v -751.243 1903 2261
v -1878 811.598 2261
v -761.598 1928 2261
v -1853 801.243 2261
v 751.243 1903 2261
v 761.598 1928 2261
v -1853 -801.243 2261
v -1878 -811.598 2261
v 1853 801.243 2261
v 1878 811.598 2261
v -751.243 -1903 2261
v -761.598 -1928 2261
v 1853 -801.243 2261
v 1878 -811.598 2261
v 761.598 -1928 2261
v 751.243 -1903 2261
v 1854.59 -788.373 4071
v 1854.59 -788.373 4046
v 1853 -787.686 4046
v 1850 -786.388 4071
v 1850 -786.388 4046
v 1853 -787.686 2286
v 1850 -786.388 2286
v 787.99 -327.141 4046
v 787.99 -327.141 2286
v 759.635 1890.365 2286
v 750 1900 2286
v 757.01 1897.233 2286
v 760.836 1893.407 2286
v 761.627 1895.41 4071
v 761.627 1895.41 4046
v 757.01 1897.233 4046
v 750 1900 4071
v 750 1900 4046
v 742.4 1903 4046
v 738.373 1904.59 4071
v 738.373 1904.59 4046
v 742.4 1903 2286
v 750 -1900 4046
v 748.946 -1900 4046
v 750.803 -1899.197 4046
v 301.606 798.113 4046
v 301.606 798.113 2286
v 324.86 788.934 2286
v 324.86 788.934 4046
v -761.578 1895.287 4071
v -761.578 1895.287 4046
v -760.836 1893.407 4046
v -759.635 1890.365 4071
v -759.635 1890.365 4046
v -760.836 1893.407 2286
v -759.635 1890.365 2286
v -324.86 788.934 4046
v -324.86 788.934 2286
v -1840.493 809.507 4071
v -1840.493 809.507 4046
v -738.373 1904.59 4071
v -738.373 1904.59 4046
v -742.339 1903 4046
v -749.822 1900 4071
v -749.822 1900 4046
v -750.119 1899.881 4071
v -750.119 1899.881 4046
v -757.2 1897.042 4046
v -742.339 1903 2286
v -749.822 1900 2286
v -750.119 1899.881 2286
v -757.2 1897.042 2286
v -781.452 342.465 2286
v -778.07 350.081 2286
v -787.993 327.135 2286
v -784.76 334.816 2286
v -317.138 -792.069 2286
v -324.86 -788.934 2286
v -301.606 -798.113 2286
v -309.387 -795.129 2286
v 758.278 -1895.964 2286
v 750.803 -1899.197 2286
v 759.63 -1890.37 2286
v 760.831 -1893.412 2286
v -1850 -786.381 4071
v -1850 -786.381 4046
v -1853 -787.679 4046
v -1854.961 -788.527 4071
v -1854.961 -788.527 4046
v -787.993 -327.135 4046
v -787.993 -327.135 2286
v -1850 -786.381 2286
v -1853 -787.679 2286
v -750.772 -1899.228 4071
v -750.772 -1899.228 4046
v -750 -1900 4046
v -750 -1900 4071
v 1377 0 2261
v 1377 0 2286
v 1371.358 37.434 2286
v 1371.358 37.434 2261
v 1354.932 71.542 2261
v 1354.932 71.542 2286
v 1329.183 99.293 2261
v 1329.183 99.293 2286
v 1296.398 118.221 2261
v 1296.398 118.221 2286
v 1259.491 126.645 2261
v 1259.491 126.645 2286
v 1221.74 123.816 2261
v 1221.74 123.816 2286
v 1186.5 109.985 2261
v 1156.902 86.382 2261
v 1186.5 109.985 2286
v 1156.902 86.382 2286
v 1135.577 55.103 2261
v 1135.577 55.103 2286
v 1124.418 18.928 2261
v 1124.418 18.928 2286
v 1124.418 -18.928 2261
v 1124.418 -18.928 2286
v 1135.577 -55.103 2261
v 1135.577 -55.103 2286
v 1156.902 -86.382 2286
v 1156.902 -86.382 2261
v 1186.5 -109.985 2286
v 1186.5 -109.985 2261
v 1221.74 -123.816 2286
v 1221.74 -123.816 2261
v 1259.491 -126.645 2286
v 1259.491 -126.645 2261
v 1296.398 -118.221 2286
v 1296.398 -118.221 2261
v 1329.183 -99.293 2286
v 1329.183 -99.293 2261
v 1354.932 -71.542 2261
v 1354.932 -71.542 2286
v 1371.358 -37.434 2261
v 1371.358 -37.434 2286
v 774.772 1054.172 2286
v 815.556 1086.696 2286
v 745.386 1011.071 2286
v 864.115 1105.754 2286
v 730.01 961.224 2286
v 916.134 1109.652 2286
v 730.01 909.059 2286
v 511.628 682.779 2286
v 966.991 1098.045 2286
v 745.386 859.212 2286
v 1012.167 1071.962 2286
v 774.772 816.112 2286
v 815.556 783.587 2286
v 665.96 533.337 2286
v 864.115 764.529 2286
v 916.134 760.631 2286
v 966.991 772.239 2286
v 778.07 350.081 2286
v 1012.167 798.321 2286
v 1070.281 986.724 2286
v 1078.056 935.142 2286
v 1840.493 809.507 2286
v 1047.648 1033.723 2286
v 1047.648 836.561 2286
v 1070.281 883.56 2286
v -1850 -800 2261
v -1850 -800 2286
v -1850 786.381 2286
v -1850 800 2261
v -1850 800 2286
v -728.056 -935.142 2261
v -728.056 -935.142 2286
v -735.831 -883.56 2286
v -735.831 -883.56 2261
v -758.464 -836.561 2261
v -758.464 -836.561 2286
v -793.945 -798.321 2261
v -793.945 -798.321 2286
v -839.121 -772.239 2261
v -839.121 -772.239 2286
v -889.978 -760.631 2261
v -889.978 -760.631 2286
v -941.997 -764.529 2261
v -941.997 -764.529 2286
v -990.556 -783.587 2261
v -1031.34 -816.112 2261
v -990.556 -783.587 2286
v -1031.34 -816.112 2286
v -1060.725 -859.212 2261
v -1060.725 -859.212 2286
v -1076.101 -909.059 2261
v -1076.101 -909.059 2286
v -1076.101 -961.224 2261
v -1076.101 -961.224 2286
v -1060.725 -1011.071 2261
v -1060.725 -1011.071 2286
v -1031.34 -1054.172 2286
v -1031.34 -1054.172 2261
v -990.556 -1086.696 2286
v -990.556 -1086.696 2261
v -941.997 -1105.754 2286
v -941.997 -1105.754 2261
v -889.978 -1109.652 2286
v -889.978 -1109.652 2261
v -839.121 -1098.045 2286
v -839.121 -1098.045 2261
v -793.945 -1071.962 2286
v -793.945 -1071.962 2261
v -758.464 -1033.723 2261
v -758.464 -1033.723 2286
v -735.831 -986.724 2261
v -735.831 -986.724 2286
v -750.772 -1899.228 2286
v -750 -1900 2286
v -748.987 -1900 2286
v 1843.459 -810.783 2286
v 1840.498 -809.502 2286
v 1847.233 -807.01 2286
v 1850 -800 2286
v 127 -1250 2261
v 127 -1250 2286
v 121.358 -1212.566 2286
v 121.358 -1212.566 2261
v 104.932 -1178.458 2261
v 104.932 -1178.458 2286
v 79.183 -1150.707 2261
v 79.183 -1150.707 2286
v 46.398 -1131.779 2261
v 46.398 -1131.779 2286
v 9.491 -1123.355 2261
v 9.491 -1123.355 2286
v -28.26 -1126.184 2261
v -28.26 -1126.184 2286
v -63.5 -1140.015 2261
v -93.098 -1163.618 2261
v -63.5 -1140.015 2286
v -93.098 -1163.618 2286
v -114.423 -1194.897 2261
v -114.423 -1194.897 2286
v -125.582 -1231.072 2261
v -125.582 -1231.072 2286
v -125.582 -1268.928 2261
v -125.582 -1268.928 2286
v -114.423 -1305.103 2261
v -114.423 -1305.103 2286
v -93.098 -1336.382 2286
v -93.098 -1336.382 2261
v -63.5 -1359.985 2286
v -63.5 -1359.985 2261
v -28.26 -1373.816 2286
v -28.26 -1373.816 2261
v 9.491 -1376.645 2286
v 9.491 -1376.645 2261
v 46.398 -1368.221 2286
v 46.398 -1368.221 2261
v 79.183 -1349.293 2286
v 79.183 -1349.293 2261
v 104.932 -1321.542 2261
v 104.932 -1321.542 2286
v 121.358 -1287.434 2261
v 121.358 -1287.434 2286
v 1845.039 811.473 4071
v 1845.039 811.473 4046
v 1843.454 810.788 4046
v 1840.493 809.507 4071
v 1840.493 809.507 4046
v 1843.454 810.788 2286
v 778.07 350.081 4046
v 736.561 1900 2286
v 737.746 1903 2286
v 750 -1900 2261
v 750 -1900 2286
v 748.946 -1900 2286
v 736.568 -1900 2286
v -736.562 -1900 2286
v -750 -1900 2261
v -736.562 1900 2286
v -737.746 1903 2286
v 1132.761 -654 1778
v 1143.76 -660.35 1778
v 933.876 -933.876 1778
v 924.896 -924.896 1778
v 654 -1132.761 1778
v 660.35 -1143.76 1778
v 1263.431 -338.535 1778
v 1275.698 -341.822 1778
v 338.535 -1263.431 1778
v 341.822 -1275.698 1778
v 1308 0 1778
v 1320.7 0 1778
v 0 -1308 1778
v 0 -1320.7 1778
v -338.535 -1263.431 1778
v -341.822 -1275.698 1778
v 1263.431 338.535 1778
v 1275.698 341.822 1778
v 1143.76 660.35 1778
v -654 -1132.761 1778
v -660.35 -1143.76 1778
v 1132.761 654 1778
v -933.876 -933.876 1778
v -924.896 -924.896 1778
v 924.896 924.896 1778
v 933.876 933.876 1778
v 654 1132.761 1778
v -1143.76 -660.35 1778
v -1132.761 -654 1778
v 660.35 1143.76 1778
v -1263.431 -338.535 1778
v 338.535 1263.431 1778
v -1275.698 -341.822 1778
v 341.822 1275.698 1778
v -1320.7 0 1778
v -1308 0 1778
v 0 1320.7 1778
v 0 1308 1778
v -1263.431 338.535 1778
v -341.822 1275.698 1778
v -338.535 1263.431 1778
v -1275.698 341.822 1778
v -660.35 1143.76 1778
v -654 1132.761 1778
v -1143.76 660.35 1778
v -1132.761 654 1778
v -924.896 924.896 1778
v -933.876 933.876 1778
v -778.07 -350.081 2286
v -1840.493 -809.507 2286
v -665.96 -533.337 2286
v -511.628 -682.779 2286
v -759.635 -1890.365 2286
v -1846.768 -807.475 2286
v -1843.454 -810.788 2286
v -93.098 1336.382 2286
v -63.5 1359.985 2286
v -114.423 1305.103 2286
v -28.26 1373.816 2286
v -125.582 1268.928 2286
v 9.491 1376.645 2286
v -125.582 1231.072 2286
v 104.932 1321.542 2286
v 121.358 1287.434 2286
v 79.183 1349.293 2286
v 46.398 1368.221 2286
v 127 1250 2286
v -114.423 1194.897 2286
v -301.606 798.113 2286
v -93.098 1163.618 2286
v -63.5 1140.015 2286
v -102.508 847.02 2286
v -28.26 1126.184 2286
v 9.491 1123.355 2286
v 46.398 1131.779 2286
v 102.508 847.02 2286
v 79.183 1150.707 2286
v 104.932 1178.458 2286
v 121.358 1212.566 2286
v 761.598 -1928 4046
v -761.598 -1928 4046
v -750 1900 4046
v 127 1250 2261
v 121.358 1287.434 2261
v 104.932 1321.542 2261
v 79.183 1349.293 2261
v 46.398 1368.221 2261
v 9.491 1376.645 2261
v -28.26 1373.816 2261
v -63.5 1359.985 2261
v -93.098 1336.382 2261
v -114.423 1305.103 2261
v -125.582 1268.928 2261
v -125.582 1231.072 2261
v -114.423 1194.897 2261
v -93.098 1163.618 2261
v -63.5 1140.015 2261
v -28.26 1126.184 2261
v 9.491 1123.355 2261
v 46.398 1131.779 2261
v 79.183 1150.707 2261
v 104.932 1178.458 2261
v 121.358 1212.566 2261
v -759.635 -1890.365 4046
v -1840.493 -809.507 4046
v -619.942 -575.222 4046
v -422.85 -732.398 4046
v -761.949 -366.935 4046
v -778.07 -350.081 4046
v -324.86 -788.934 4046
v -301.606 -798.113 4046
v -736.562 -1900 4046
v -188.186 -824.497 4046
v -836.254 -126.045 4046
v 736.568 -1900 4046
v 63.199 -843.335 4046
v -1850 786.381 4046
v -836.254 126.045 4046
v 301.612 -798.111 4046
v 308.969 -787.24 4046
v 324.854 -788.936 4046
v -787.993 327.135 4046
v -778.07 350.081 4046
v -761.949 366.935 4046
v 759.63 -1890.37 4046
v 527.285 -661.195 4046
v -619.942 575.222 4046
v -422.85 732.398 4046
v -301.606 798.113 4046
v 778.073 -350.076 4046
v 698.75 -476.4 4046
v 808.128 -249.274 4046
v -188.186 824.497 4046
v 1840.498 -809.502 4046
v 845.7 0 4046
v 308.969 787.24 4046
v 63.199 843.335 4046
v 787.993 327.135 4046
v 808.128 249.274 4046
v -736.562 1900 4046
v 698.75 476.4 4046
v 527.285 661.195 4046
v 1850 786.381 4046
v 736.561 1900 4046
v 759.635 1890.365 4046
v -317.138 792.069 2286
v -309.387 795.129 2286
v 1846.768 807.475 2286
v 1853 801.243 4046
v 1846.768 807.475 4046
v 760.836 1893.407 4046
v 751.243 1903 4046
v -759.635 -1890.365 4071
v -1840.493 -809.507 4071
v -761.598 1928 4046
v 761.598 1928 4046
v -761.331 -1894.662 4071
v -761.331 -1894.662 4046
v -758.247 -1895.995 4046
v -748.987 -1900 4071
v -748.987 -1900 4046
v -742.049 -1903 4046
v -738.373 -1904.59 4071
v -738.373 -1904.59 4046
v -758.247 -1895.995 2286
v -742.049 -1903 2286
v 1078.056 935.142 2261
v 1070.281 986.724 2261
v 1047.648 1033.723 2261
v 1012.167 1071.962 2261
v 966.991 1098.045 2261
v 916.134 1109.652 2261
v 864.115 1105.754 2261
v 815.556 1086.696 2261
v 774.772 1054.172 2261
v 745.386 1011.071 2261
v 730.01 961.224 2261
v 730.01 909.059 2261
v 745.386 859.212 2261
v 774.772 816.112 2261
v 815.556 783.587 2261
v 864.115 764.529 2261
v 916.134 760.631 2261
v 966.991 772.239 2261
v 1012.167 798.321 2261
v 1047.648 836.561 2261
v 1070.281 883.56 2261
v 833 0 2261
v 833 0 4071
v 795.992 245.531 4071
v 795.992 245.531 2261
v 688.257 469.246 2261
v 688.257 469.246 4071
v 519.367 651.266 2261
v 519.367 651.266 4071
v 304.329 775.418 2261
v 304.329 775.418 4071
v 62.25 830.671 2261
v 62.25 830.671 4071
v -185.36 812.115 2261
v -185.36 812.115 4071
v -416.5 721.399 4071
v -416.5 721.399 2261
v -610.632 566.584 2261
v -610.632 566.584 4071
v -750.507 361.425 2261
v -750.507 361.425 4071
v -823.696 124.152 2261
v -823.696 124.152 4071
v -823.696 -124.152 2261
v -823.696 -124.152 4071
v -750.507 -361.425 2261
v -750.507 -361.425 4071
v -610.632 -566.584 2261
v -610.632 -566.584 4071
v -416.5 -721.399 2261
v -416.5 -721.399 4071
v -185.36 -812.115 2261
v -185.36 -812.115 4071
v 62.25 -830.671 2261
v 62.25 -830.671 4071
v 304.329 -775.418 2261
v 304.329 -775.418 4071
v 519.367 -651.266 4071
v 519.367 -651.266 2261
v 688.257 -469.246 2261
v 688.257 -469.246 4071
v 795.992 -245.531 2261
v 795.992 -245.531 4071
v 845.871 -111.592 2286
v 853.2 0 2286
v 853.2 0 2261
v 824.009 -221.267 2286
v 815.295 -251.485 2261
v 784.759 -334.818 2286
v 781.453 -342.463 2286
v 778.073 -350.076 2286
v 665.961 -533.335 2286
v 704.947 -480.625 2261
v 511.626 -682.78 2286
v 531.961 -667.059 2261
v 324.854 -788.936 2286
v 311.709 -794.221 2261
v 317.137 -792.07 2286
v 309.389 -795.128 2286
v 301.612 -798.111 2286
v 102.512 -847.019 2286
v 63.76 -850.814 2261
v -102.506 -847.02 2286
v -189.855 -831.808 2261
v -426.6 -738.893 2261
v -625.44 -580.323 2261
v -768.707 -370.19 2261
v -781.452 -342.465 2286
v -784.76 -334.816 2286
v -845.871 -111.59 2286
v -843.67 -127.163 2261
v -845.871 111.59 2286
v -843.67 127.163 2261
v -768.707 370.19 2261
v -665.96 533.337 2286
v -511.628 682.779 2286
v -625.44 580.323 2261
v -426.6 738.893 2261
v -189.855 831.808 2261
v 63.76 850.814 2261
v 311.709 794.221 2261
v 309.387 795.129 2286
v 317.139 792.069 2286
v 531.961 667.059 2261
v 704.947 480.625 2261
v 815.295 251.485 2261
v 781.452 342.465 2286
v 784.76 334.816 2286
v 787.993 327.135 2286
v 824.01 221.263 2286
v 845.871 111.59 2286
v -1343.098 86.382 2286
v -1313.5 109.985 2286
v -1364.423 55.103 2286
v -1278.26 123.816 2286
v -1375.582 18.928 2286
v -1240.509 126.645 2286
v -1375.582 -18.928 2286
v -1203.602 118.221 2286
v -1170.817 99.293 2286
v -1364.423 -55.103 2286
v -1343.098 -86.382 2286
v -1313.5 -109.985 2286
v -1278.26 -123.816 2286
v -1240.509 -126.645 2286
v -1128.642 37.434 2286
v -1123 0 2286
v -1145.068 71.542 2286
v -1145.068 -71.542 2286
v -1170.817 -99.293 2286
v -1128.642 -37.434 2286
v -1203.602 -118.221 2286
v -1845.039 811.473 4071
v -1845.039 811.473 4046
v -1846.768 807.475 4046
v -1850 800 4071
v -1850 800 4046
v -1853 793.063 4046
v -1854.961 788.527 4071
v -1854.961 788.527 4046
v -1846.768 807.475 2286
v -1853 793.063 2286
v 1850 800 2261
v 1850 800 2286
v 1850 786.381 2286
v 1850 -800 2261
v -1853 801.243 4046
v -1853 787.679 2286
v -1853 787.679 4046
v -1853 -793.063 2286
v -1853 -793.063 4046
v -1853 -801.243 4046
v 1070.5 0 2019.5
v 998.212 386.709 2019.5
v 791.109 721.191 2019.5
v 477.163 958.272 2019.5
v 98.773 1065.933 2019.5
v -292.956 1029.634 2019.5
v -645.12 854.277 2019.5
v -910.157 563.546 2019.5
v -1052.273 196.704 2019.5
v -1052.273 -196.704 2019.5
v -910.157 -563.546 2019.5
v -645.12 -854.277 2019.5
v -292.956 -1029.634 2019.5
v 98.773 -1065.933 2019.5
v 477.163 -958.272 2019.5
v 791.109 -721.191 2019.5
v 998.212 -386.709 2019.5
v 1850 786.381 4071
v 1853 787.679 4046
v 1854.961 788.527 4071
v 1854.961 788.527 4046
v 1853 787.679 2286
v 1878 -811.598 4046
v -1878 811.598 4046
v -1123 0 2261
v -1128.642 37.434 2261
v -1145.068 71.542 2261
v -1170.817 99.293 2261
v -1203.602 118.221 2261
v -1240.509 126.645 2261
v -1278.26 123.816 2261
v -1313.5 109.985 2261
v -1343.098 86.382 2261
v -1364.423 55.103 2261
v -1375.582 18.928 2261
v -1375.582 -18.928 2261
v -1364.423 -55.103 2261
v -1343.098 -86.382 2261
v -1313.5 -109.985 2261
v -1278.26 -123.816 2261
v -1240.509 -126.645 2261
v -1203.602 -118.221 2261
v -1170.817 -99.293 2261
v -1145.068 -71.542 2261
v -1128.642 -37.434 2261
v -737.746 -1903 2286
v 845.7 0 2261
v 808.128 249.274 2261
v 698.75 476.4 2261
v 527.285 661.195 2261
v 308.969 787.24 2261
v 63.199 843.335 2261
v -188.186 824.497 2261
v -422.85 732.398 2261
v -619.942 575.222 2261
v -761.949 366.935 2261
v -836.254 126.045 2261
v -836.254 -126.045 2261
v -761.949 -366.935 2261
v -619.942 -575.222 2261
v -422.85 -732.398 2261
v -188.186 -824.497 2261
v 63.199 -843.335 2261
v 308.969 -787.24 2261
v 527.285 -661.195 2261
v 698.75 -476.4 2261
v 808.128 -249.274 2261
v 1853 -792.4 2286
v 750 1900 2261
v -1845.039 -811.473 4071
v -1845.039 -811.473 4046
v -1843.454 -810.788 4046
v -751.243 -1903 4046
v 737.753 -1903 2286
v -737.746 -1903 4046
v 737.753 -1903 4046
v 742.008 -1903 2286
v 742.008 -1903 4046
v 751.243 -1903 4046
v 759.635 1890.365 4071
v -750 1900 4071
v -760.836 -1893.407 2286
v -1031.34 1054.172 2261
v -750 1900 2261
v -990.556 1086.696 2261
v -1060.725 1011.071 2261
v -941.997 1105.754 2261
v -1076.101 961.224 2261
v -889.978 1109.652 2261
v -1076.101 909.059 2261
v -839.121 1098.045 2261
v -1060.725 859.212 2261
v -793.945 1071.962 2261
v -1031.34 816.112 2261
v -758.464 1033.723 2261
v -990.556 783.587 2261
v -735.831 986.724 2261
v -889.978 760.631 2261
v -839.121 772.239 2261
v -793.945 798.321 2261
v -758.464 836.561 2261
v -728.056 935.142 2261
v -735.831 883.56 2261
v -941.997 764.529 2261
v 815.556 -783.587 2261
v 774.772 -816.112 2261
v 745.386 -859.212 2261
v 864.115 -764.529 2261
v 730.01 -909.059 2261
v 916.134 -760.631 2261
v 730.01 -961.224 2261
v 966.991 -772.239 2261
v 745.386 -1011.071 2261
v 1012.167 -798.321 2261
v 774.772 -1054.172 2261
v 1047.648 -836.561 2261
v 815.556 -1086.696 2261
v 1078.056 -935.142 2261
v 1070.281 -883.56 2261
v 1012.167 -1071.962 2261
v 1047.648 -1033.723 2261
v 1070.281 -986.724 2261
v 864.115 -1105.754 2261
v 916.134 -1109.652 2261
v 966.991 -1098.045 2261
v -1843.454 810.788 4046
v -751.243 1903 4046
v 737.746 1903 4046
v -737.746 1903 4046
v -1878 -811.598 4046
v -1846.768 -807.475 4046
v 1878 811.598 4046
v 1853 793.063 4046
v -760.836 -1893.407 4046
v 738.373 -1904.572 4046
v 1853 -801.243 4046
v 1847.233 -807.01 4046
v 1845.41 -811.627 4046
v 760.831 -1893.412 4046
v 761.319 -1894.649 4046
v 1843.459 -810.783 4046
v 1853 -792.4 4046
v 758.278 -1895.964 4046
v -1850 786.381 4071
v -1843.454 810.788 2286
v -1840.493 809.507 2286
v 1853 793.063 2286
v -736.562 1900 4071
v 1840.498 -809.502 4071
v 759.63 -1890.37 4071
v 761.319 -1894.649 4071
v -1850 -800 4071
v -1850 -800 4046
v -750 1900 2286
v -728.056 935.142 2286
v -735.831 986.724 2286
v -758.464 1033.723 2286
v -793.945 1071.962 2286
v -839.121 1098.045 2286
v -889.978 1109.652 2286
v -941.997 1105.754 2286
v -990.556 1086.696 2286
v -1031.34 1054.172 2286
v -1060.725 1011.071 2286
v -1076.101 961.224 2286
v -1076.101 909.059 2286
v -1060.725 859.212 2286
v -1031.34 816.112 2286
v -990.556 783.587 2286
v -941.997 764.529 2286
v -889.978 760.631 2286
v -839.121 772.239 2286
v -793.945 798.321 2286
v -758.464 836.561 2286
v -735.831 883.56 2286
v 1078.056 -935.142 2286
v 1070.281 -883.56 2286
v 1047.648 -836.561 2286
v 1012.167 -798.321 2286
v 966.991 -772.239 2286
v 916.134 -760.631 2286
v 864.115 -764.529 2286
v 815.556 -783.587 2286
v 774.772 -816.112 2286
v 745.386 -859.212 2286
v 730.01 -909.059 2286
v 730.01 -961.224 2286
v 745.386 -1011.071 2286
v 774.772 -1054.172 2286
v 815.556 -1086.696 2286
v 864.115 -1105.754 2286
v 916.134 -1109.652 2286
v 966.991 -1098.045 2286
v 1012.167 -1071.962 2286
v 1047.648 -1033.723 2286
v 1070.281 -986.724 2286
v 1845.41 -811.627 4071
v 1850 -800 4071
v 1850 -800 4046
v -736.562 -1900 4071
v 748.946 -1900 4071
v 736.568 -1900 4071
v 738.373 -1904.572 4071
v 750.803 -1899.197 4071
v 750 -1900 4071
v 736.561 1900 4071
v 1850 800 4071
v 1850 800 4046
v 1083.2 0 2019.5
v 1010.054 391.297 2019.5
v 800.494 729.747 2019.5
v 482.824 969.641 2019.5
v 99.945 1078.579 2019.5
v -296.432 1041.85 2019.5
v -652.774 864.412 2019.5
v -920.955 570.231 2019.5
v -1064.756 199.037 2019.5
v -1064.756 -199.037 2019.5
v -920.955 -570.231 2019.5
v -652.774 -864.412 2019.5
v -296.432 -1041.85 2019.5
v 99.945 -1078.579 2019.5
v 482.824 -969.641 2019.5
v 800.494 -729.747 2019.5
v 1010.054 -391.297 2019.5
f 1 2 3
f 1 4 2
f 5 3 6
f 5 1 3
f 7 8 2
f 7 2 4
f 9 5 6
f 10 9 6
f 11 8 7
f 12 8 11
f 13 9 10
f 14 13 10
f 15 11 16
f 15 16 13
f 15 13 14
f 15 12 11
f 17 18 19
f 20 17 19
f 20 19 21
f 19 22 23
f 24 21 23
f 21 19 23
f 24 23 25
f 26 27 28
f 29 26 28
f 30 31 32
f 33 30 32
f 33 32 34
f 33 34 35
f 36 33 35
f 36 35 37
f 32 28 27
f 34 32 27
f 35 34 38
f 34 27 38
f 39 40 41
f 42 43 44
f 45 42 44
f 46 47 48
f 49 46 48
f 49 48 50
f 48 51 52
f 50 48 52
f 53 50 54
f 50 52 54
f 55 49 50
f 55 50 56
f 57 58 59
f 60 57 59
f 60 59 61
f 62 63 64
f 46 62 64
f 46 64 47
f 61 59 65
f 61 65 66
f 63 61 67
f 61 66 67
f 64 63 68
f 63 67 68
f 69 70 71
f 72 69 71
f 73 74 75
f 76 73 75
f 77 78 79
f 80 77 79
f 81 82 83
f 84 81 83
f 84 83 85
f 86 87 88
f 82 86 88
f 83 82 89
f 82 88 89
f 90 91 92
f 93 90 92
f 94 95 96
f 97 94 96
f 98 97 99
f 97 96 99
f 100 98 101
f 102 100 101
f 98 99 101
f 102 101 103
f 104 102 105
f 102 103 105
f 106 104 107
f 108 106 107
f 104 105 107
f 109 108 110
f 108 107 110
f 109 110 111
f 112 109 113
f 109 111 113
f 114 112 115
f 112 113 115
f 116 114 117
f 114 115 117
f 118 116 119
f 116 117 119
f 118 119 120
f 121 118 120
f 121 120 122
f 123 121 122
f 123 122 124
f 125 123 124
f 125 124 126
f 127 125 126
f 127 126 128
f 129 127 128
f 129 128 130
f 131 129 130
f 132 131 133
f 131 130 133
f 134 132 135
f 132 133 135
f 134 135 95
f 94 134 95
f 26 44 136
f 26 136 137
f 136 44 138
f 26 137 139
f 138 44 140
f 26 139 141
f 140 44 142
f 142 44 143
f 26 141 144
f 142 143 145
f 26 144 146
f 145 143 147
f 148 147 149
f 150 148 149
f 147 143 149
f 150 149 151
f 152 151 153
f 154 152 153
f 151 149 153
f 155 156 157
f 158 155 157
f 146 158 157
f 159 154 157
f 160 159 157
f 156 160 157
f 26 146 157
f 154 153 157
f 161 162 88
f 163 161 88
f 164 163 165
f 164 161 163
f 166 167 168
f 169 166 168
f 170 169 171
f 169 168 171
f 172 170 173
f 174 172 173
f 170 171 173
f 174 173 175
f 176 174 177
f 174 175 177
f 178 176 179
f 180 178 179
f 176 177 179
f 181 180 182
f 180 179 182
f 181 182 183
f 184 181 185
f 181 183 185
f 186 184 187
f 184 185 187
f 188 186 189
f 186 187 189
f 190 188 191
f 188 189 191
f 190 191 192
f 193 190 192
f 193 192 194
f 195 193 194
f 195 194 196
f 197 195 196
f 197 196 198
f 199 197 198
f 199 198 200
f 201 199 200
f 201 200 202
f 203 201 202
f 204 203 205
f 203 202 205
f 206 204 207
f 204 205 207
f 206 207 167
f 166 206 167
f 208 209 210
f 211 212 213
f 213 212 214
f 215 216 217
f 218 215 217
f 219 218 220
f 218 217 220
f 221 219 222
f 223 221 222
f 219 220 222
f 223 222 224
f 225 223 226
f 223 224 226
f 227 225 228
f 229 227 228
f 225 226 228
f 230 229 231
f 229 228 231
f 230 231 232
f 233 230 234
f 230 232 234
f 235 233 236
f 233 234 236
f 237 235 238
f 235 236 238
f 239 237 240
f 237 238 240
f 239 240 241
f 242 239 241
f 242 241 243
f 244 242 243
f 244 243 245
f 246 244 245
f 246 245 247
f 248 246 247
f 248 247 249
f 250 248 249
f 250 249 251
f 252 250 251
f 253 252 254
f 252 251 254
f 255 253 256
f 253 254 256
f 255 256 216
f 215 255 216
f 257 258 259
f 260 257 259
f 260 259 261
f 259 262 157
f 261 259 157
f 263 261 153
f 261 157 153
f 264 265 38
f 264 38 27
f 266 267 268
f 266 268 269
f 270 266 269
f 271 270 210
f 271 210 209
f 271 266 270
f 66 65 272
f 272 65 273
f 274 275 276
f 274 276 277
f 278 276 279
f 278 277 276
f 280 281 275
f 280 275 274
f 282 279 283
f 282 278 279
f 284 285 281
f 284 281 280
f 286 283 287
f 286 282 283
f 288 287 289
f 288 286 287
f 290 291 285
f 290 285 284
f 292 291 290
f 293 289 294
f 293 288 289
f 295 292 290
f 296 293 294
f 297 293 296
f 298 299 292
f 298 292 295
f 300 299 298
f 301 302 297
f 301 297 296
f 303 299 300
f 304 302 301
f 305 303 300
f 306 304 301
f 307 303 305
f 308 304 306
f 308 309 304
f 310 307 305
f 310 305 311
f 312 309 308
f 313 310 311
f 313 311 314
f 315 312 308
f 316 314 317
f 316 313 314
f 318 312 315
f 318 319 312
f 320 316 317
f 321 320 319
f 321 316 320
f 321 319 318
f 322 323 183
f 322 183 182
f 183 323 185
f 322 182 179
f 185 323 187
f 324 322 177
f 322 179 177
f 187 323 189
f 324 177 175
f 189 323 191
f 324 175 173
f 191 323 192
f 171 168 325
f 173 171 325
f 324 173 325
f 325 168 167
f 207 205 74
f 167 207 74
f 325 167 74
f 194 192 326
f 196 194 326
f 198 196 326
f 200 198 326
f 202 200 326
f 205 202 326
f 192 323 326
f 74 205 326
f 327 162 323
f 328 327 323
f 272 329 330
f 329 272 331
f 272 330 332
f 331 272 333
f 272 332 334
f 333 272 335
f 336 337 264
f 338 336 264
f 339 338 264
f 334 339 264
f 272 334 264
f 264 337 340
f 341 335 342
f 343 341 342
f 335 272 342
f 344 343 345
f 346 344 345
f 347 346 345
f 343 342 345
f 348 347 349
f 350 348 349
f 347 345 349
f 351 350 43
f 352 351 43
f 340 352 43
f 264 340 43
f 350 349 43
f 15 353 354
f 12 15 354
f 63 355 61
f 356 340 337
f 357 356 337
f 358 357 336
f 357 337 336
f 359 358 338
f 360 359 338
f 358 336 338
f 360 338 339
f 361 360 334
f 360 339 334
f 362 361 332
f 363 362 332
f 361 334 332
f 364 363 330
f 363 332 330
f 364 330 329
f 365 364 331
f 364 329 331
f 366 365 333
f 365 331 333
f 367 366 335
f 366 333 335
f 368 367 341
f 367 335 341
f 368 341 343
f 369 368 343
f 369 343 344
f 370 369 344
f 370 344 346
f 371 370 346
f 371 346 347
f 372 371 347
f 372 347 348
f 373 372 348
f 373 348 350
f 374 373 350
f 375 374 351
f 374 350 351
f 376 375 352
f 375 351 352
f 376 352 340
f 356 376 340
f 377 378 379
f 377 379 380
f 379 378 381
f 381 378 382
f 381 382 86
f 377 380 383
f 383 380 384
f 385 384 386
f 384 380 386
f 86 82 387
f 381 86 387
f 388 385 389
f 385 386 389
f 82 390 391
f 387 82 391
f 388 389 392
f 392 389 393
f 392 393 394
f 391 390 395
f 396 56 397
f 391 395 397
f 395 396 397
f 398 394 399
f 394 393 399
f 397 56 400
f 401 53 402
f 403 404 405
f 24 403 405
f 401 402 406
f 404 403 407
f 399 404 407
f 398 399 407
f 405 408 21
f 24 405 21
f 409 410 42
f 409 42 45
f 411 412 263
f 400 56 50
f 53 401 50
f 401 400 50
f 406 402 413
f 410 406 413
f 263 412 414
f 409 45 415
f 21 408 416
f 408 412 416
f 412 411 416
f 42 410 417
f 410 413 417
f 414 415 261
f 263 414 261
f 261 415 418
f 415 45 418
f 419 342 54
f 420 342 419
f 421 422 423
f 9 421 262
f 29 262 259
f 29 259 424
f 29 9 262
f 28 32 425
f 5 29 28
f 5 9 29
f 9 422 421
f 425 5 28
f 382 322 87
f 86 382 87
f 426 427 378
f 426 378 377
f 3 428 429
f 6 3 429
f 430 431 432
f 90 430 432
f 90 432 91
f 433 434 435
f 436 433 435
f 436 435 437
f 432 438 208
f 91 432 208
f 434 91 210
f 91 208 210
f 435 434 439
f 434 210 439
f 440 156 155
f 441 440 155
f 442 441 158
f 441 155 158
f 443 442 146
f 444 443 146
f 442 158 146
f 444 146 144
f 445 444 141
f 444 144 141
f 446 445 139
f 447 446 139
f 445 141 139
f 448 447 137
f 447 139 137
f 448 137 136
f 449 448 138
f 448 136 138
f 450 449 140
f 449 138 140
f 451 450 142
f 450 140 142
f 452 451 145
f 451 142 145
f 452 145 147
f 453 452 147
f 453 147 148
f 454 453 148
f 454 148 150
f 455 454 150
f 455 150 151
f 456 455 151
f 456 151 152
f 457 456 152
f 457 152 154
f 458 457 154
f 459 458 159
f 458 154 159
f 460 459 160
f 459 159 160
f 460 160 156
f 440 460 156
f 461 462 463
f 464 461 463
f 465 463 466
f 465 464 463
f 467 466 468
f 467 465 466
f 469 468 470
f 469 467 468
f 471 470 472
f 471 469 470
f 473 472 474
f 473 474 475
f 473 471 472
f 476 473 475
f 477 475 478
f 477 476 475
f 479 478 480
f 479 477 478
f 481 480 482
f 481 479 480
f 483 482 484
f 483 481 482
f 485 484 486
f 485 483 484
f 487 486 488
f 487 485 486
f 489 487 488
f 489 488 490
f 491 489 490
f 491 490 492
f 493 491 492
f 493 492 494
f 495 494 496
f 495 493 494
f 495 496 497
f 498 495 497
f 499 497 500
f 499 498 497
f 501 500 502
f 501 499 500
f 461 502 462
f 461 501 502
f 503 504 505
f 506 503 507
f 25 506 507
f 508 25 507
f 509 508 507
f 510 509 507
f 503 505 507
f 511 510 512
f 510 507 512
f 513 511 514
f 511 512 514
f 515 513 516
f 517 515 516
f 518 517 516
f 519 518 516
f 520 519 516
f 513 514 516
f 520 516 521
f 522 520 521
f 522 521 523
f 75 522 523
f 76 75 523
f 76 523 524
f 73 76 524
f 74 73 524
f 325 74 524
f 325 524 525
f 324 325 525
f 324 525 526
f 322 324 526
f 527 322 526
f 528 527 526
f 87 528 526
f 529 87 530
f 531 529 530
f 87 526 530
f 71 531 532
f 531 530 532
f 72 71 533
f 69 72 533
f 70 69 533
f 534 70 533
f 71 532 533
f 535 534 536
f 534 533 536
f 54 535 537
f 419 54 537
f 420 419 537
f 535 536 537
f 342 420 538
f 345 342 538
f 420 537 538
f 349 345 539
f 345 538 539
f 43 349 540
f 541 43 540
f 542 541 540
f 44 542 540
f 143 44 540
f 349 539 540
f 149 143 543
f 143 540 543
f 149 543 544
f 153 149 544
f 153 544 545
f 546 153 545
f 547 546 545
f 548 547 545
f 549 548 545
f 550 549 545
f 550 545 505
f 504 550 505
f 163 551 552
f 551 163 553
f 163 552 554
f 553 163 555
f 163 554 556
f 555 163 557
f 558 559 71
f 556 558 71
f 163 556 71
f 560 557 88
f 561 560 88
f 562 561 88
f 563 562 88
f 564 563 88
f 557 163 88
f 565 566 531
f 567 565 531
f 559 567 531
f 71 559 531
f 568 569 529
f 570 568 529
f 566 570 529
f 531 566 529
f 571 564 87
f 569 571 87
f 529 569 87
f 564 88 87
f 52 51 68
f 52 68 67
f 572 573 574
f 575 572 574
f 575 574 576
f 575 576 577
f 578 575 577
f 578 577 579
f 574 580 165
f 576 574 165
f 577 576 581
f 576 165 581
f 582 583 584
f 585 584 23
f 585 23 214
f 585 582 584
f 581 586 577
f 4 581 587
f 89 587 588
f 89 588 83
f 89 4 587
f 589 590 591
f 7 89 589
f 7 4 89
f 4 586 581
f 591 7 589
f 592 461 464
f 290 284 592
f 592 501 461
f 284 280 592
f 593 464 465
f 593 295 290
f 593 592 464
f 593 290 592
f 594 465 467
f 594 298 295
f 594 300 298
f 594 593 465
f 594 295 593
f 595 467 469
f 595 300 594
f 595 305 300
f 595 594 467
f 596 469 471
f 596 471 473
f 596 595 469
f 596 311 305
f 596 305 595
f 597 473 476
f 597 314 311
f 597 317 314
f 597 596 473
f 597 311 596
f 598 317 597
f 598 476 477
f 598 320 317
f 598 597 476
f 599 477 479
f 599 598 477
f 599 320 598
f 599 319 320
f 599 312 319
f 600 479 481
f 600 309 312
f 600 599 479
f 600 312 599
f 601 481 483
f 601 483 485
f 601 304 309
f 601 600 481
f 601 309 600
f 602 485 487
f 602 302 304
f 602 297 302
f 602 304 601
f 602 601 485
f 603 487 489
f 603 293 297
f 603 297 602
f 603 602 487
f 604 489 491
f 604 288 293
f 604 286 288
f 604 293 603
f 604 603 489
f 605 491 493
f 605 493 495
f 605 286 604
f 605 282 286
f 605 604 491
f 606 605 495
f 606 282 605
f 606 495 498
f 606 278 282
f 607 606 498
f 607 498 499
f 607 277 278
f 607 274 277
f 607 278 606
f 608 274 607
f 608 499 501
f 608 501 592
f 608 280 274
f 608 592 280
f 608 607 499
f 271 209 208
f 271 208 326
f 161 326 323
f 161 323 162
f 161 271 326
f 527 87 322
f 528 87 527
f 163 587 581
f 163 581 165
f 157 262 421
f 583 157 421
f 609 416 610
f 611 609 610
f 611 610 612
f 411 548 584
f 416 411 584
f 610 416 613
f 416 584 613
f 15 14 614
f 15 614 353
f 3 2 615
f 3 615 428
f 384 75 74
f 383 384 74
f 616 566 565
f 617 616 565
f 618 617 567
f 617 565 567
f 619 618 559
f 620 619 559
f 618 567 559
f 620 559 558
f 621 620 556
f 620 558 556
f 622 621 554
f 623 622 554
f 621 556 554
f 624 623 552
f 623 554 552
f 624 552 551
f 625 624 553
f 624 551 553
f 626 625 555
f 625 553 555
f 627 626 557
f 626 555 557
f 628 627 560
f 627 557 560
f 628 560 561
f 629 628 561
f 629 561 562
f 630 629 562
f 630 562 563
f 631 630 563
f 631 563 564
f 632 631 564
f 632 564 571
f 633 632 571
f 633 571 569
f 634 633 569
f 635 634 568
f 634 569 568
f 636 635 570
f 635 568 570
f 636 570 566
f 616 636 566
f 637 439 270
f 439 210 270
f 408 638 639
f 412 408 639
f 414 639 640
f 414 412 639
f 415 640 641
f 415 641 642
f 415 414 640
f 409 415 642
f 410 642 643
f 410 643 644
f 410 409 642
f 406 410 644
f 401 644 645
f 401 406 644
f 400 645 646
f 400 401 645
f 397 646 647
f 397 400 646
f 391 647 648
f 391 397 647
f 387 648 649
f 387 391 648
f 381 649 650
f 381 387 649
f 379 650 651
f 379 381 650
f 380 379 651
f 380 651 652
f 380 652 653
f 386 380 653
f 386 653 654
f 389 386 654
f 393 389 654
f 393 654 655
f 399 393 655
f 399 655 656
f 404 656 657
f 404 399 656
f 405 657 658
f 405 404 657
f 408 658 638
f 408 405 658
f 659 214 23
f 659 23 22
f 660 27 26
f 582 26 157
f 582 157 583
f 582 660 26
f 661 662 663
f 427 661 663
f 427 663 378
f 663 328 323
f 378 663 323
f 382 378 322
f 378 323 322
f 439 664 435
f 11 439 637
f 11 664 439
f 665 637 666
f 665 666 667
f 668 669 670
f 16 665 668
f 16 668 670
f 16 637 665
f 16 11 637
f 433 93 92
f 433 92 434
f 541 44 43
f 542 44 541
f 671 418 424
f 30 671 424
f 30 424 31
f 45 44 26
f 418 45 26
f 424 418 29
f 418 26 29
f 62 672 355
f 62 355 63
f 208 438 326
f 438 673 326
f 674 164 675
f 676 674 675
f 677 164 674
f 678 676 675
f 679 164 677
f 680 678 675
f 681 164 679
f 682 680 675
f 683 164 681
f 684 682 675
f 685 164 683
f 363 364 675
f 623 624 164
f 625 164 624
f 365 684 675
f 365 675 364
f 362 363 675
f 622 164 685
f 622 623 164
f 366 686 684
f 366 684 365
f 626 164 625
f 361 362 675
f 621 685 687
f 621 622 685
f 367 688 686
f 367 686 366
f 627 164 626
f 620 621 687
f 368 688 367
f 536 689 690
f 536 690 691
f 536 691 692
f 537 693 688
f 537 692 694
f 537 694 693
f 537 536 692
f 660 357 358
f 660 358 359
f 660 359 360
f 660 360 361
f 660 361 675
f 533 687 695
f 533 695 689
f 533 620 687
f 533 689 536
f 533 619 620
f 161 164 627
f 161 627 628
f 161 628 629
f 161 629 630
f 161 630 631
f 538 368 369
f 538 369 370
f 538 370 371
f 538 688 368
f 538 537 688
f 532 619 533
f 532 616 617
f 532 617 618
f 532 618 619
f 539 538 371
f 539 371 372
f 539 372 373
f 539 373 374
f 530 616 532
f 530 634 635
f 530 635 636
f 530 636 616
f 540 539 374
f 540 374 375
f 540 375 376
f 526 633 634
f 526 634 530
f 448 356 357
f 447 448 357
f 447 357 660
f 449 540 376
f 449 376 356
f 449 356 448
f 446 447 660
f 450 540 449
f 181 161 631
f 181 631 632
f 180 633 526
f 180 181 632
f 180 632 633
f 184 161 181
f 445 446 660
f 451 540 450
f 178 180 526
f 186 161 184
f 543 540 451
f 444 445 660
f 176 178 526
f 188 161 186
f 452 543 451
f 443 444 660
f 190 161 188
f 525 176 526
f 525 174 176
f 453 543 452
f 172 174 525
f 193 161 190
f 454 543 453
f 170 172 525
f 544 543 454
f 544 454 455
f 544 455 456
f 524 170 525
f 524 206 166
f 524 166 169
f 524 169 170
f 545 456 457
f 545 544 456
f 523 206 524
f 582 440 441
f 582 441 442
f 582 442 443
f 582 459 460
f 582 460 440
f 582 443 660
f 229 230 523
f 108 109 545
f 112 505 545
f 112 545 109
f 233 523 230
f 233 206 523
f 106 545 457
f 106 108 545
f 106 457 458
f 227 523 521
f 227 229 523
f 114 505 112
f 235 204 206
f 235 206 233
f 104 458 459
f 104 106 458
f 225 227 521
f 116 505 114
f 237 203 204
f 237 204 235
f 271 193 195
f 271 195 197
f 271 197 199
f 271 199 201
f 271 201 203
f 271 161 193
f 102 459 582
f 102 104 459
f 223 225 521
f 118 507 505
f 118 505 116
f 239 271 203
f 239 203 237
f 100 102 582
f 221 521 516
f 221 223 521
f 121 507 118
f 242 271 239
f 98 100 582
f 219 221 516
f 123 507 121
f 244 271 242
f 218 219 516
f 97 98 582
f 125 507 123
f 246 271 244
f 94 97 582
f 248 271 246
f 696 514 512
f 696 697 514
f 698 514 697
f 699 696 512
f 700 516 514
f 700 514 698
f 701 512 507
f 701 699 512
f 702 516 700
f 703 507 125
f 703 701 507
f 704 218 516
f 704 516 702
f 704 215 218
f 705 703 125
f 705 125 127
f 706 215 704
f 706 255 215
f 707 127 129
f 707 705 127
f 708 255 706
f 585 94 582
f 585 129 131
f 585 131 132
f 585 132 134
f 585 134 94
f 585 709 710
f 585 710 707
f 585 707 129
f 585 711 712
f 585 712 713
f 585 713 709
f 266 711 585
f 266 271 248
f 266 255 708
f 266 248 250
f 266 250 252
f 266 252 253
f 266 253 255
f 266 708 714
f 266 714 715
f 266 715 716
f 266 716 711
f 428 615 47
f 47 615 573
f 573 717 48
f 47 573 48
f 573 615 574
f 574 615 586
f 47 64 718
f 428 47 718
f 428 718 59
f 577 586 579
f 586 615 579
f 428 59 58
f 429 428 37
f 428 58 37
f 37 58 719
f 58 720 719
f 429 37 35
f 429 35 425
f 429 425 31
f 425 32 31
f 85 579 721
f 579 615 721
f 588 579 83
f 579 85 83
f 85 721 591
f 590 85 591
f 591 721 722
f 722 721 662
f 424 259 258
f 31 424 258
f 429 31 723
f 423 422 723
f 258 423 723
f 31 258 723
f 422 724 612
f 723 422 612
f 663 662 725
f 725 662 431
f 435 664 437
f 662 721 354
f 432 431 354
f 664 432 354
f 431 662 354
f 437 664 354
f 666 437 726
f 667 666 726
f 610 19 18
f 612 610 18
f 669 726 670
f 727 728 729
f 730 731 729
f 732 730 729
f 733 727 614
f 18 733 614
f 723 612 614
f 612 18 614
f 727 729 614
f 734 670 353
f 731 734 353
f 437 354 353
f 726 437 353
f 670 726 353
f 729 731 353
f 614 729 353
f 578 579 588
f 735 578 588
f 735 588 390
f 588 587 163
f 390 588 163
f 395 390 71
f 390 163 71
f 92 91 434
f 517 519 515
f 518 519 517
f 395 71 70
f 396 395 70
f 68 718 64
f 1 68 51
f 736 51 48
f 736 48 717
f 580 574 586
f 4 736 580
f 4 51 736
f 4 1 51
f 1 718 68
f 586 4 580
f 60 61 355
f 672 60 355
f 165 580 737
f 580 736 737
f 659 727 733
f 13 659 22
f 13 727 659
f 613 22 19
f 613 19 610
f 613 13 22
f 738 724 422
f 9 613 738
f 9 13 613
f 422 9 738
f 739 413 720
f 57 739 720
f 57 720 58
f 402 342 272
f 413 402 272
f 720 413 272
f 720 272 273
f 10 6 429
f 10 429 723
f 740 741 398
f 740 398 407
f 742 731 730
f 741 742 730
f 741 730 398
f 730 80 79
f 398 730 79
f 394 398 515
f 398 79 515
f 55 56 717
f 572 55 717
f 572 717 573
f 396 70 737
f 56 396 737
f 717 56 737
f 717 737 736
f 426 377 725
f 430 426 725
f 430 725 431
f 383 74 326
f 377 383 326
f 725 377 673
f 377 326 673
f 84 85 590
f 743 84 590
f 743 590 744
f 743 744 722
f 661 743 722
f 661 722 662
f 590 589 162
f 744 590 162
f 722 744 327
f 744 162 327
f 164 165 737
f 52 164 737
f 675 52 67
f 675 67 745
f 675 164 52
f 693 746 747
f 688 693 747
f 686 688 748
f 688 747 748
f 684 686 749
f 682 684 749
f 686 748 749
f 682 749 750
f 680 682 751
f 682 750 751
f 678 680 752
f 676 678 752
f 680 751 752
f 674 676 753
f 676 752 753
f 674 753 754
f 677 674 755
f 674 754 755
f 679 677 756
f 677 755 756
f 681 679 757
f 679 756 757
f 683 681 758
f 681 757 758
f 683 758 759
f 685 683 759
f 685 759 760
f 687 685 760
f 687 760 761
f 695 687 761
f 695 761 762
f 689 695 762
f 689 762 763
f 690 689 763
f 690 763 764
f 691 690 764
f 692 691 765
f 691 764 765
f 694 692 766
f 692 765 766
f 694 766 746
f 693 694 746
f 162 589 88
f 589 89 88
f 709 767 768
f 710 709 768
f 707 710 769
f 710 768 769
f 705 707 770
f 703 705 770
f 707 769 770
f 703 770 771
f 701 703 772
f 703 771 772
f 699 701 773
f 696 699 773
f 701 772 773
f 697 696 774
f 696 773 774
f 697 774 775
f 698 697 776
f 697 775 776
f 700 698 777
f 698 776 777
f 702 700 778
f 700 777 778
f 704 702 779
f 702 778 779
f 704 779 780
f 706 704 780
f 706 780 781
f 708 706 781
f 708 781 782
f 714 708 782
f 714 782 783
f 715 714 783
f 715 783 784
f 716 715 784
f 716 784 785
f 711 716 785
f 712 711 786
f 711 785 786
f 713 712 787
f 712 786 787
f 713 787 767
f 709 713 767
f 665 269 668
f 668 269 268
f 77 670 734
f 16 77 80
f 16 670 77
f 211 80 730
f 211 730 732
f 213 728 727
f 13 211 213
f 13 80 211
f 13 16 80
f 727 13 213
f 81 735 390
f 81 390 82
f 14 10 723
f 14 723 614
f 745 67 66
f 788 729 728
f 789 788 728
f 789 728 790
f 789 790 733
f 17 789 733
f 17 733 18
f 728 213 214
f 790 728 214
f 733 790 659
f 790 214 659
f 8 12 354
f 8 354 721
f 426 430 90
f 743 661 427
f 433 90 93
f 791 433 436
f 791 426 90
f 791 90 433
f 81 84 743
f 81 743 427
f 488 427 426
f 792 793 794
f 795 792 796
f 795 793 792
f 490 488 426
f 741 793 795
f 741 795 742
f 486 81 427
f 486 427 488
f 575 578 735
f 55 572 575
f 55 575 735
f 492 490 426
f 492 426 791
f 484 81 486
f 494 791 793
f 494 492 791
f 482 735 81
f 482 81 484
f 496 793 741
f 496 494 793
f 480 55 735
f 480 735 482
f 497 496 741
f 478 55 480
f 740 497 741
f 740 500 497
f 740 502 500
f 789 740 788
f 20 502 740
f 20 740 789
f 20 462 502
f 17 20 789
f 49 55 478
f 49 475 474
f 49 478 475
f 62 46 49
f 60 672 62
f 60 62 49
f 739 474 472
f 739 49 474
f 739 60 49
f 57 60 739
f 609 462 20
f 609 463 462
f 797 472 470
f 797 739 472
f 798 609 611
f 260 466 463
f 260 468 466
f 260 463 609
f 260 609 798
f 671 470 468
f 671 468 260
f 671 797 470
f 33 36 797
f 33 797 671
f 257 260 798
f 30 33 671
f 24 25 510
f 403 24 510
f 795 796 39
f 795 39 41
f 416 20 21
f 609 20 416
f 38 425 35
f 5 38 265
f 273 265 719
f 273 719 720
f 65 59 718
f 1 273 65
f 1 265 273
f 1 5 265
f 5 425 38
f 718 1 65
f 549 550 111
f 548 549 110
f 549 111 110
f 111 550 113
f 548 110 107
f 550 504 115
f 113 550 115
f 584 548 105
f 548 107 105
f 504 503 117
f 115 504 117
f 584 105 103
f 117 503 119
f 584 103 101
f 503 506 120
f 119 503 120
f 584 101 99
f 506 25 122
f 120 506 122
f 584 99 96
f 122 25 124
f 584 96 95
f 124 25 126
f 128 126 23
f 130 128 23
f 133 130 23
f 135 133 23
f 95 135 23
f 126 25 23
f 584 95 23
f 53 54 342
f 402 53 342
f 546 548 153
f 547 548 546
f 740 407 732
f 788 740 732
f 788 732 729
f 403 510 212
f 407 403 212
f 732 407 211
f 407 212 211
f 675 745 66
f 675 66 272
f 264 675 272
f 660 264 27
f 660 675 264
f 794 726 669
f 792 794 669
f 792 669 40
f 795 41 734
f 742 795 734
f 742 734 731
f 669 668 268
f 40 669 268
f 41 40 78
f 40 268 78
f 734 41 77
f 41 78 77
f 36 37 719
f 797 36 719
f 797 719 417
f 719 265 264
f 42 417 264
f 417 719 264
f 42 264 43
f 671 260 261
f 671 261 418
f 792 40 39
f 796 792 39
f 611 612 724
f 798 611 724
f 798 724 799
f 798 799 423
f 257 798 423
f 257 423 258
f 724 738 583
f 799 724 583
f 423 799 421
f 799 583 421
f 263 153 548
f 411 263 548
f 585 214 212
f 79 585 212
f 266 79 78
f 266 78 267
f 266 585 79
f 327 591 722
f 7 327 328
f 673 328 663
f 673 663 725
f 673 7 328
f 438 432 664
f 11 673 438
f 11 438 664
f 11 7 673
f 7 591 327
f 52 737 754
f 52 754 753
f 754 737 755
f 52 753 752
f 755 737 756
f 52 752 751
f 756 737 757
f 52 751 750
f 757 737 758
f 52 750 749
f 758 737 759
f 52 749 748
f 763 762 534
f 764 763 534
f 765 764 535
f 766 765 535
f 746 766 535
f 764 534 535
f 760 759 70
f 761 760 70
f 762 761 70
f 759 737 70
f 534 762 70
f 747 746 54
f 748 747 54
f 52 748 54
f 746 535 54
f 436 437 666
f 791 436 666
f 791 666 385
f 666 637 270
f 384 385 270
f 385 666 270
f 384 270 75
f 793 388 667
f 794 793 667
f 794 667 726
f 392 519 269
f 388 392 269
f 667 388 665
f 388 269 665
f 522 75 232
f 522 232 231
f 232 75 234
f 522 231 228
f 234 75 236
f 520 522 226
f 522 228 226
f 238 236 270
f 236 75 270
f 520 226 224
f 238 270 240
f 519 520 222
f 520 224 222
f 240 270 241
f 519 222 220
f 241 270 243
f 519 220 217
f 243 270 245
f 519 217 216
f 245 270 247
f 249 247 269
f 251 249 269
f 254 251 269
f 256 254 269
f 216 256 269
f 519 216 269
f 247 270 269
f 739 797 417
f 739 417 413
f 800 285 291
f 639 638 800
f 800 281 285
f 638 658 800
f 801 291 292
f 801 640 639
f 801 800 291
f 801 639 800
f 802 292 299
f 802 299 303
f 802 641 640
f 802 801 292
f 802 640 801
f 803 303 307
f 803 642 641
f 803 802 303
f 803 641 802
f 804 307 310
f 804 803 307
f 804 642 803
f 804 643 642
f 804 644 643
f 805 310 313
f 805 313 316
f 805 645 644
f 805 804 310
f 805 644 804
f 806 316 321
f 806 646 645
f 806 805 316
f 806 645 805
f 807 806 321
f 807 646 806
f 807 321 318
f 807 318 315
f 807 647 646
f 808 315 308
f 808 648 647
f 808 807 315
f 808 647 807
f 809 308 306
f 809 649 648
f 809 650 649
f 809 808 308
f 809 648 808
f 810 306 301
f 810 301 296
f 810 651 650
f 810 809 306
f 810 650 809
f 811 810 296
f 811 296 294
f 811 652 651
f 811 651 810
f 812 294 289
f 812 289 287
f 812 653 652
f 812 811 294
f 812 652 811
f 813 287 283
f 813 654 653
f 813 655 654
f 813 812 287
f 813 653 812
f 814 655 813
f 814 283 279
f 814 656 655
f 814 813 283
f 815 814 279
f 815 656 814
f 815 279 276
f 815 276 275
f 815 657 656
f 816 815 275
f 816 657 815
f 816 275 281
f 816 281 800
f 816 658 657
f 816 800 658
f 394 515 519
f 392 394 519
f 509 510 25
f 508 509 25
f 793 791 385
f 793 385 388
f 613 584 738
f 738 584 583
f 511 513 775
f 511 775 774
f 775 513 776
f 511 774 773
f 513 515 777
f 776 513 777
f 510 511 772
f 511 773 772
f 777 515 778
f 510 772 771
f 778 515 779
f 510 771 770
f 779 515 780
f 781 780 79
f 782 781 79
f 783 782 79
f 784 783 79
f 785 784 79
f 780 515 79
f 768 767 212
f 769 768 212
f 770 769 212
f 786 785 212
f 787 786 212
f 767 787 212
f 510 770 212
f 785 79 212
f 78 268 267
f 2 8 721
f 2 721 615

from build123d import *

# Parameters (mm, degrees)
F3_R      = 853.2
F4_DEPTH  = 25
F5_R      = 127
F6_DEPTH  = 25
F7_R      = 175
F8_DEPTH  = 25
F11_DEPTH = 1785
F12_R     = 845.7
F13_DEPTH = 25
F16_DEPTH = 1785


with BuildPart() as f1:
    # F0 (on Front) → F1 (revolve)
    with BuildSketch(Plane.XZ):
        Polygon((845.7, 4071), (833, 4071), (833, 2261), (1308, 1778), (1320.7, 1778), (845.7, 2261), align=None)
    revolve(axis=Axis((0, 0, 40.9754104912), (0, 0, 1)))



with BuildPart() as f4:
    # F3 (on offset) → F4 (new body)
    with BuildSketch(Plane(origin=(0, 0, 2261), x_dir=(1, 0, 0), z_dir=(0, 0, -1))):
        Polygon((-1850, -800), (-750, -1900), (750, -1900), (1850, -800), (1850, 800), (750, 1900), (-750, 1900), (-1850, 800), align=None)
        Circle(F3_R, mode=Mode.SUBTRACT)
    extrude(amount=-F4_DEPTH)

    # F5 (on face) → F6 (cut, through all)
    with BuildSketch(Plane.XY.offset(2286)):
        with Locations((0, 1250)):
            Circle(F5_R)
        with Locations((-1250, 0)):
            Circle(F5_R)
        with Locations((0, -1250)):
            Circle(F5_R)
        with Locations((1250, 0)):
            Circle(F5_R)
    extrude(amount=-F6_DEPTH, mode=Mode.SUBTRACT)

    # F7 (on face) → F8 (cut, through all)
    with BuildSketch(Plane.XY.offset(2286)):
        with Locations((-903.0558815967, 935.1417404402)):
            Circle(F7_R)
        with Locations((903.0558815967, 935.1417404402)):
            Circle(F7_R)
        with Locations((-903.0558815967, -935.1417404402)):
            Circle(F7_R)
        with Locations((903.0558815967, -935.1417404402)):
            Circle(F7_R)
    extrude(amount=-F8_DEPTH, mode=Mode.SUBTRACT)

    # F10 (on face) → F11 (join, through all)
    with BuildSketch(Plane.XY.offset(2286)):
        Polygon((-778.0701837337, 350.081460784), (-1845.0386106164, 811.4732129495), (-1854.9613893836, 788.5267870505), (-787.9929625008, 327.135034885), align=None)
        Polygon((-301.6060889253, 798.1127784487), (-738.3732480972, 1904.5895816842), (-761.5782024883, 1895.2874264656), (-324.859643518, 788.9337437411), align=None)
        Polygon((761.6269402666, 1895.4104183158), (738.3730597334, 1904.5895816842), (301.6059005615, 798.1127784487), (324.8597810947, 788.9336150803), align=None)
        Polygon((1854.9613893836, 788.5267870505), (1845.0386106164, 811.4732129495), (778.0701837337, 350.081460784), (787.9929625008, 327.135034885), align=None)
        Polygon((-787.9929625008, -327.135034885), (-1854.9613893836, -788.5267870505), (-1845.0386106164, -811.4732129495), (-778.0701837337, -350.081460784), align=None)
        Polygon((-324.859643518, -788.9337437411), (-761.3312444642, -1894.6617994714), (-738.3732480972, -1904.5895816842), (-301.6060889253, -798.1127784487), align=None)
        Polygon((738.3730597334, -1904.5719468468), (761.3194856324, -1894.6491680797), (324.8538176881, -788.9361426209), (301.6119825201, -798.1105512398), align=None)
        Polygon((1845.4104183158, -811.6269402666), (1854.5895816842, -788.3730597334), (787.9904795888, -327.141015584), (778.0728407593, -350.0755553773), align=None)
    extrude(amount=F11_DEPTH)


with BuildPart() as f1_1:
    add(f1.part)

    add(f4.part)  # F13 merges F4
    # F12 (on face) → F13 (join)
    with BuildSketch(Plane.XY.offset(4071)):
        Polygon((-750, 1900), (-1850, 800), (-1850, -800), (-750, -1900), (750, -1900), (1850, -800), (1850, 800), (750, 1900), align=None)
        Circle(F12_R, mode=Mode.SUBTRACT)
    extrude(amount=-F13_DEPTH)

    # F14: union 

    # F15 (on face) → F16 (join, through all)
    with BuildSketch(Plane(origin=(0, 0, 2261), x_dir=(1, 0, 0), z_dir=(0, 0, -1))):
        Polygon((-761.5979797464, -1928), (761.5979797464, -1928), (1878, -811.5979797464), (1878, 811.5979797464), (761.5979797464, 1928), (-761.5979797464, 1928), (-1878, 811.5979797464), (-1878, -811.5979797464), align=None)
        Polygon((1853, -801.2426406871), (751.2426406871, -1903), (-751.2426406871, -1903), (-1853, -801.2426406871), (-1853, 801.2426406871), (-751.2426406871, 1903), (751.2426406871, 1903), (1853, 801.2426406871), align=None, mode=Mode.SUBTRACT)
    extrude(amount=-F16_DEPTH)


solid = f1_1.part
